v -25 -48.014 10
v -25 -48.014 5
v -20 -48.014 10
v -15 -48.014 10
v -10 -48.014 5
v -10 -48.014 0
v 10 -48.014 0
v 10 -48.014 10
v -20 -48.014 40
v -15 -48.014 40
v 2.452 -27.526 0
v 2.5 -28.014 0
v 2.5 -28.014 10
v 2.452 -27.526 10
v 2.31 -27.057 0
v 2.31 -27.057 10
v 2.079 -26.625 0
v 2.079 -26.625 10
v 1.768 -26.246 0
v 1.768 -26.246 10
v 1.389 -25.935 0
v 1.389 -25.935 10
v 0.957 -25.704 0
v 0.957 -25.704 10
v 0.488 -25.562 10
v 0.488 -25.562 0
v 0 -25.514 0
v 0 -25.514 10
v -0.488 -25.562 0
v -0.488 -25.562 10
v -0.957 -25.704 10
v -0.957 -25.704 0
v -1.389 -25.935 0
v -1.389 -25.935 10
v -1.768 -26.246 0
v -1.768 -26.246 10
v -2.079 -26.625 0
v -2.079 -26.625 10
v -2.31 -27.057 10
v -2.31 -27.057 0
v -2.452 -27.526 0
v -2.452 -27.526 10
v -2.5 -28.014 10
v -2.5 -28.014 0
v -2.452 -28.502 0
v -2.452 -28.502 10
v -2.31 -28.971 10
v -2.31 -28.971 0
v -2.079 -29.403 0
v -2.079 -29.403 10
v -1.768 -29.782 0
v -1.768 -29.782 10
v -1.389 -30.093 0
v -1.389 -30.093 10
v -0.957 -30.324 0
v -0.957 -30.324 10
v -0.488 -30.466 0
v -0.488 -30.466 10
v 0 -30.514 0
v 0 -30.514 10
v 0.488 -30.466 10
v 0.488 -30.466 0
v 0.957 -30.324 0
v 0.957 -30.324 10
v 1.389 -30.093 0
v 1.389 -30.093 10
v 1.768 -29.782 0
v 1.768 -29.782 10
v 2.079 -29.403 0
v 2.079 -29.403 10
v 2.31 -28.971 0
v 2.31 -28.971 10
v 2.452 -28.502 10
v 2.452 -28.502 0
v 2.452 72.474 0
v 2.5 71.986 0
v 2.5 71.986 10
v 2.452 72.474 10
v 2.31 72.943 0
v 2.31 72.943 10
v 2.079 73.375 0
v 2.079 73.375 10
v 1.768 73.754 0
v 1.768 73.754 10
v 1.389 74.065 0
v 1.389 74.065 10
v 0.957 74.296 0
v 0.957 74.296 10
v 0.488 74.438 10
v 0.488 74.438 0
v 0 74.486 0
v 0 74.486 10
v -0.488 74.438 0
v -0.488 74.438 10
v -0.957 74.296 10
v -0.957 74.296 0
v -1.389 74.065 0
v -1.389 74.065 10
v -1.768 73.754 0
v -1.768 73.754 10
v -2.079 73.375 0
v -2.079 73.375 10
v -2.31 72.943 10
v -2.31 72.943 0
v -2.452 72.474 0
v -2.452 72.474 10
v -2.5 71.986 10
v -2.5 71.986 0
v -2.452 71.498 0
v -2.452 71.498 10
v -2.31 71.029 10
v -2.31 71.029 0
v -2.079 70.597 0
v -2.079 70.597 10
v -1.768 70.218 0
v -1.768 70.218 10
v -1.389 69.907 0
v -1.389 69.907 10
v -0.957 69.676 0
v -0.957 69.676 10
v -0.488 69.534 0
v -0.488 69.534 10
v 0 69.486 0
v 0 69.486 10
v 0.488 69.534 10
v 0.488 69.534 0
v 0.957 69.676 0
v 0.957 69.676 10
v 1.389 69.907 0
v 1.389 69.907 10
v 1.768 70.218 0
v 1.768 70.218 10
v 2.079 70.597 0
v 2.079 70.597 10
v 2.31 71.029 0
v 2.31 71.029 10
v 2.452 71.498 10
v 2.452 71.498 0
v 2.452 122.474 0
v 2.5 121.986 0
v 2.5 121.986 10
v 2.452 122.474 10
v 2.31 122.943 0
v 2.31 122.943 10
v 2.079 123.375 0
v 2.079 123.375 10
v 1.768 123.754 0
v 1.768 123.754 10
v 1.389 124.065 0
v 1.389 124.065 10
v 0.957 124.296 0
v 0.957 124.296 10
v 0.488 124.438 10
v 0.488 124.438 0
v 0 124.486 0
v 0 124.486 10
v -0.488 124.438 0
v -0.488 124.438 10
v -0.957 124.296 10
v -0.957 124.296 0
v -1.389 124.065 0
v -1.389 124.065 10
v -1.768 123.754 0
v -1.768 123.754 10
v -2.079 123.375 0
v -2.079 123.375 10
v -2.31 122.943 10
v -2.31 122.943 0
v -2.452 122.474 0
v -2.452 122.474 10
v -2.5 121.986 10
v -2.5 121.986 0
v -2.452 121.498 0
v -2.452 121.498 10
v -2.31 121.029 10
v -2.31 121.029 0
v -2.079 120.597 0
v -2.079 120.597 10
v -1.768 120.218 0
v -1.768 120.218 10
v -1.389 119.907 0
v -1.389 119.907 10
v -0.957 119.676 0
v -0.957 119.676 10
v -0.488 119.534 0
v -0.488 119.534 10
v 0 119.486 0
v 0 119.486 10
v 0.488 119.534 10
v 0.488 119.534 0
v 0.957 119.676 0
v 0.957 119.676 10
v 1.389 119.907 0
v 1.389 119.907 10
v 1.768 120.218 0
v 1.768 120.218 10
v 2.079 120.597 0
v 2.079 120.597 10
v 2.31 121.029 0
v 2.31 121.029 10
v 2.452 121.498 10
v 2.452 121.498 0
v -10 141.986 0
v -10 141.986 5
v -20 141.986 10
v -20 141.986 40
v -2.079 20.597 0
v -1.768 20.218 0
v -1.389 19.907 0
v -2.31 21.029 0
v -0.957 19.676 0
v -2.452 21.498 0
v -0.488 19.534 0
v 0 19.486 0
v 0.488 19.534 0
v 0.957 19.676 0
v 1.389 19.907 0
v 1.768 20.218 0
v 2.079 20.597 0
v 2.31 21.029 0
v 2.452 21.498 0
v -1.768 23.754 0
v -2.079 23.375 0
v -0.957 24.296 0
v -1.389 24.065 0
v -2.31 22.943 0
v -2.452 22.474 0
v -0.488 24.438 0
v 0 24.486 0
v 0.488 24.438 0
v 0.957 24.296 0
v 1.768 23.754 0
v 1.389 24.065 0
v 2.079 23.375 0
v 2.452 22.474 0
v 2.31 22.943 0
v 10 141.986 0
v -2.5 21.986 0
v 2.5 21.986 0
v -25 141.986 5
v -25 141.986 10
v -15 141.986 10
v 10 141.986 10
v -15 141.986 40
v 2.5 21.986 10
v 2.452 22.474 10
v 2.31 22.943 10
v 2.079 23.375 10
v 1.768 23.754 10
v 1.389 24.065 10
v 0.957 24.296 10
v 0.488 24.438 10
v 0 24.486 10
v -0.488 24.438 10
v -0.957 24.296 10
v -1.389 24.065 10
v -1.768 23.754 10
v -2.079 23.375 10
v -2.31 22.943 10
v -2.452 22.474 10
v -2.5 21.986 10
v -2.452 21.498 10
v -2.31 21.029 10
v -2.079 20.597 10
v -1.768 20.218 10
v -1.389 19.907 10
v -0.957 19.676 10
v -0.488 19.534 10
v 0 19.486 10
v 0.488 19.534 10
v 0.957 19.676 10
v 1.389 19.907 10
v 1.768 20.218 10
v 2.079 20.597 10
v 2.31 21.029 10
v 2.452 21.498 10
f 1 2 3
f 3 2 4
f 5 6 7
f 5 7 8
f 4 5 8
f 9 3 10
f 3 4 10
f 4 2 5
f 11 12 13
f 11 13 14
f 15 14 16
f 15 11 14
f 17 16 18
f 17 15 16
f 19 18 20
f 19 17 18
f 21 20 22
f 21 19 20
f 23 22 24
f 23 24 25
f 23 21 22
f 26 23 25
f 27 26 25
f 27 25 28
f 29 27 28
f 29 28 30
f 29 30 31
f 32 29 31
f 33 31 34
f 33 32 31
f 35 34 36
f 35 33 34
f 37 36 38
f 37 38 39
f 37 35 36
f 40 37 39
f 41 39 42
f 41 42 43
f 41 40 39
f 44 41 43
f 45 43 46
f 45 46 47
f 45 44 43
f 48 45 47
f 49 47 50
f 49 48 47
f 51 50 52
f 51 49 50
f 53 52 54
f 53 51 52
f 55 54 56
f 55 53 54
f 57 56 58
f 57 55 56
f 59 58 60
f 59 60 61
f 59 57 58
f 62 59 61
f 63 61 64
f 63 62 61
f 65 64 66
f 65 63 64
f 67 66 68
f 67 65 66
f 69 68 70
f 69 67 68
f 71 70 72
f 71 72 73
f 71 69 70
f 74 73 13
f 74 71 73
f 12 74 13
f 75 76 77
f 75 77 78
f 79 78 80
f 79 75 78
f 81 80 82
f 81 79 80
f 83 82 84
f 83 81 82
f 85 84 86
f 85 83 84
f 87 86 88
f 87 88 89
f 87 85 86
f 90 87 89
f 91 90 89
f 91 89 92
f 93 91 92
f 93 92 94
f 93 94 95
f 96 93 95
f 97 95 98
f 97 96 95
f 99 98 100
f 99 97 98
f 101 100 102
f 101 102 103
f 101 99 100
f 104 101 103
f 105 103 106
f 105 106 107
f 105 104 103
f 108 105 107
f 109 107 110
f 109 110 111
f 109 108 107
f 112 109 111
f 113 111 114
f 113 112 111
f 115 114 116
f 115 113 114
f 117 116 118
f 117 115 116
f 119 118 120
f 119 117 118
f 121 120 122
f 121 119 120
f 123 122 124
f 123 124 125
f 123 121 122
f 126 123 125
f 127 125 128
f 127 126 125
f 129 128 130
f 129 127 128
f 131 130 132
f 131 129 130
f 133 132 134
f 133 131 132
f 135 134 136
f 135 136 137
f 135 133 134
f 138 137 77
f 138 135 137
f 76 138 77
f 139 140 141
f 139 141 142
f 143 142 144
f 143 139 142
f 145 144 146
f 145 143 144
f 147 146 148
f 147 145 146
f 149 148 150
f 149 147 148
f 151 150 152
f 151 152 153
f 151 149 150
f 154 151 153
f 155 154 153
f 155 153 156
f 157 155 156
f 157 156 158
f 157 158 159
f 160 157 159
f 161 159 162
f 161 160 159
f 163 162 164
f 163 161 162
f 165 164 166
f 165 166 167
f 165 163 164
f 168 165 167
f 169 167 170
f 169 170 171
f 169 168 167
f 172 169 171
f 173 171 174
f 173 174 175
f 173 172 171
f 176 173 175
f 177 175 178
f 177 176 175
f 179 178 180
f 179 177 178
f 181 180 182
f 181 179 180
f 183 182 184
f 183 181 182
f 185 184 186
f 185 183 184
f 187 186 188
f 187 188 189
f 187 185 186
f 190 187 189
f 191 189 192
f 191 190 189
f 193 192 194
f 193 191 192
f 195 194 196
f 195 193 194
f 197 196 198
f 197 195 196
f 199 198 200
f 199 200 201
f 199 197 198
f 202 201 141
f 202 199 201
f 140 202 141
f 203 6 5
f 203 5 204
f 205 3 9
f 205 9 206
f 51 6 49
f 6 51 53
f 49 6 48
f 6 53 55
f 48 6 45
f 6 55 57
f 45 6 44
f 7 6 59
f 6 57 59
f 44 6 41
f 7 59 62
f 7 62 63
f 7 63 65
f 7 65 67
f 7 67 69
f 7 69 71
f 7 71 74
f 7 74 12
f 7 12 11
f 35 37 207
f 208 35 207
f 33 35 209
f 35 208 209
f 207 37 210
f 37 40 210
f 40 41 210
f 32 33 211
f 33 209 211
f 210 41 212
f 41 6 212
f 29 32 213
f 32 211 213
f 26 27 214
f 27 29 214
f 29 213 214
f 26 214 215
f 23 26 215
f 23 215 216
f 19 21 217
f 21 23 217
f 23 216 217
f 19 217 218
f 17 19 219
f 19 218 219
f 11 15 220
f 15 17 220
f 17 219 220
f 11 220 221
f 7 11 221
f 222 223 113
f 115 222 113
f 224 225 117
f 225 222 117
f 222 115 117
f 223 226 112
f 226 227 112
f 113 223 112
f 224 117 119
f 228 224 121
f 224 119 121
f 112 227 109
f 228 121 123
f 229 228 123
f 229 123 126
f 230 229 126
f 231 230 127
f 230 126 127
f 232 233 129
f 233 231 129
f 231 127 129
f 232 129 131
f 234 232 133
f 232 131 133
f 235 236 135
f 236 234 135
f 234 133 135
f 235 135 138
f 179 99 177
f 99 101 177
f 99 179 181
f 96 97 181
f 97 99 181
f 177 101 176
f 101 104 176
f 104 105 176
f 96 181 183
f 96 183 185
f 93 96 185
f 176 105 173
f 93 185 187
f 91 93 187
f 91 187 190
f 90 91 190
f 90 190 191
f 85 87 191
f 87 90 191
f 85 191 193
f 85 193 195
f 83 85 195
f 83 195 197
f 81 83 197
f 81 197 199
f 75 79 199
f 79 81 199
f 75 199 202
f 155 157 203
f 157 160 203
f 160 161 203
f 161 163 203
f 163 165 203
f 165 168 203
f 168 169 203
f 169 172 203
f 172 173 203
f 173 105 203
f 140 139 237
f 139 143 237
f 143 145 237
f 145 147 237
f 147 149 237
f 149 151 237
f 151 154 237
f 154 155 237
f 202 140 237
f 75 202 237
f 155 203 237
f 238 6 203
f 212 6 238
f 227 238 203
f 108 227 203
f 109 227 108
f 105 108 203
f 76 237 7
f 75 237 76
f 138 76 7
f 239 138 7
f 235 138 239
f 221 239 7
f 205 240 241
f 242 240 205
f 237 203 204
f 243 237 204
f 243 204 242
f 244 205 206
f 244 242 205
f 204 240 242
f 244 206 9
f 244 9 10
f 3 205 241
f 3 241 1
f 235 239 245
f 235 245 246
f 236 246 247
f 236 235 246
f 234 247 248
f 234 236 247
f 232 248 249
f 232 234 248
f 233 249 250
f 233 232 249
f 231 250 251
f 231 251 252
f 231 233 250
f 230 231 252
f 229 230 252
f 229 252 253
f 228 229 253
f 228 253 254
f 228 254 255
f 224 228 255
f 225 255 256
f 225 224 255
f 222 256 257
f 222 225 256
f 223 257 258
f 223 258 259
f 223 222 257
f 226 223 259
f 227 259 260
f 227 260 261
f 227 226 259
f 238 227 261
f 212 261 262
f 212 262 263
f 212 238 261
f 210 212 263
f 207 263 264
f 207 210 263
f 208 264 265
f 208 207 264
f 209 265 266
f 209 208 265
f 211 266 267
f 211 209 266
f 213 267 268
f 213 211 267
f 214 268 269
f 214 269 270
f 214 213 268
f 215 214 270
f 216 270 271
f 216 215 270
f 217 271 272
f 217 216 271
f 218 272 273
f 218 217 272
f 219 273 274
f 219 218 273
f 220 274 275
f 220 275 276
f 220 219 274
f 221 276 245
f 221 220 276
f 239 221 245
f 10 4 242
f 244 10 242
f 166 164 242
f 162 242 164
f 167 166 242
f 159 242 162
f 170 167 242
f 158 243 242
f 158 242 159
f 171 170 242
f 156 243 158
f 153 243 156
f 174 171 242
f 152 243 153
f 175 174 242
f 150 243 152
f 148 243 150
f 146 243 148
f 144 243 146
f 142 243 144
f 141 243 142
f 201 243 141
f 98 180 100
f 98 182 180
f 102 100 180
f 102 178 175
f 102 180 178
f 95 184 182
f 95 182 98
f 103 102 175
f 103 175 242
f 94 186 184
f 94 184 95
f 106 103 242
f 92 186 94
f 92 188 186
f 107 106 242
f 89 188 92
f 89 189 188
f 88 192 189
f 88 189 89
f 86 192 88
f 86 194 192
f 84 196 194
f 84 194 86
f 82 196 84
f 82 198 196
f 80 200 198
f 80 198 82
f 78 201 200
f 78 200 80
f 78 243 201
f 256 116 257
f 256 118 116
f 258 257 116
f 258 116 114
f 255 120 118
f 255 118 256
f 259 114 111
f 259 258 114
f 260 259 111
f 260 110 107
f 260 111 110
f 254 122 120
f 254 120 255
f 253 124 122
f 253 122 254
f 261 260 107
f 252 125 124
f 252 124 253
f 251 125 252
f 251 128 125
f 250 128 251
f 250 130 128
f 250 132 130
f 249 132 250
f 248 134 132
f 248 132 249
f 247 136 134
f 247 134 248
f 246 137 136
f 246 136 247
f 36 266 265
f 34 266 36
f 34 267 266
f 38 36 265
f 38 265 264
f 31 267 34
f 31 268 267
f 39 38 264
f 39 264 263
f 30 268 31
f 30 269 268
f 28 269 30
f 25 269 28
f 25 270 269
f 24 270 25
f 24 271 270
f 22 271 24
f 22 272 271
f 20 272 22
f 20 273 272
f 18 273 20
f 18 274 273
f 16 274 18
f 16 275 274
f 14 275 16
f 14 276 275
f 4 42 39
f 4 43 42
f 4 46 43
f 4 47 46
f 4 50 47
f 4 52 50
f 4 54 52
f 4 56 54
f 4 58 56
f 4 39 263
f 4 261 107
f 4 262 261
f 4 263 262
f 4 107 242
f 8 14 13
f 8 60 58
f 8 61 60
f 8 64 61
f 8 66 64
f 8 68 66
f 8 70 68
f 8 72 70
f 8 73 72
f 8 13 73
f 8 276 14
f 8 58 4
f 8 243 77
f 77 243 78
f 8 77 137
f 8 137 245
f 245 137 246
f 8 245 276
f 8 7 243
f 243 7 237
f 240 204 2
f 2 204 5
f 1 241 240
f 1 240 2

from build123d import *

# Parameters (mm, degrees)
F0_W     = 20
F0_H     = 190
F0_R     = 2.5
F1_DEPTH = 10
F2_W     = 190
F2_H     = 5
F3_DEPTH = 15
F4_W     = 5
F4_H     = 190
F5_DEPTH = 30


with BuildPart() as f1:
    # F0 (on Top) → F1 (new body)
    with BuildSketch(Plane.XY):
        with Locations((0, 46.986108)):
            Rectangle(F0_W, F0_H)
        with Locations((0, -28.013892)):
            Circle(F0_R, mode=Mode.SUBTRACT)
        with Locations((0, 21.986108)):
            Circle(F0_R, mode=Mode.SUBTRACT)
        with Locations((0, 71.986108)):
            Circle(F0_R, mode=Mode.SUBTRACT)
        with Locations((0, 121.986108)):
            Circle(F0_R, mode=Mode.SUBTRACT)
    extrude(amount=F1_DEPTH)

    # F2 (on face) → F3 (join)
    with BuildSketch(Plane(origin=(-10, 0, 0), x_dir=(0, -1, 0), z_dir=(-1, 0, 0))):
        with Locations((-46.986108, 7.5)):
            Rectangle(F2_W, F2_H)
    extrude(amount=F3_DEPTH)

    # F4 (on face) → F5 (join)
    with BuildSketch(Plane.XY.offset(10)):
        with Locations((-17.5, 46.986108)):
            Rectangle(F4_W, F4_H)
    extrude(amount=F5_DEPTH)


solid = f1.part
